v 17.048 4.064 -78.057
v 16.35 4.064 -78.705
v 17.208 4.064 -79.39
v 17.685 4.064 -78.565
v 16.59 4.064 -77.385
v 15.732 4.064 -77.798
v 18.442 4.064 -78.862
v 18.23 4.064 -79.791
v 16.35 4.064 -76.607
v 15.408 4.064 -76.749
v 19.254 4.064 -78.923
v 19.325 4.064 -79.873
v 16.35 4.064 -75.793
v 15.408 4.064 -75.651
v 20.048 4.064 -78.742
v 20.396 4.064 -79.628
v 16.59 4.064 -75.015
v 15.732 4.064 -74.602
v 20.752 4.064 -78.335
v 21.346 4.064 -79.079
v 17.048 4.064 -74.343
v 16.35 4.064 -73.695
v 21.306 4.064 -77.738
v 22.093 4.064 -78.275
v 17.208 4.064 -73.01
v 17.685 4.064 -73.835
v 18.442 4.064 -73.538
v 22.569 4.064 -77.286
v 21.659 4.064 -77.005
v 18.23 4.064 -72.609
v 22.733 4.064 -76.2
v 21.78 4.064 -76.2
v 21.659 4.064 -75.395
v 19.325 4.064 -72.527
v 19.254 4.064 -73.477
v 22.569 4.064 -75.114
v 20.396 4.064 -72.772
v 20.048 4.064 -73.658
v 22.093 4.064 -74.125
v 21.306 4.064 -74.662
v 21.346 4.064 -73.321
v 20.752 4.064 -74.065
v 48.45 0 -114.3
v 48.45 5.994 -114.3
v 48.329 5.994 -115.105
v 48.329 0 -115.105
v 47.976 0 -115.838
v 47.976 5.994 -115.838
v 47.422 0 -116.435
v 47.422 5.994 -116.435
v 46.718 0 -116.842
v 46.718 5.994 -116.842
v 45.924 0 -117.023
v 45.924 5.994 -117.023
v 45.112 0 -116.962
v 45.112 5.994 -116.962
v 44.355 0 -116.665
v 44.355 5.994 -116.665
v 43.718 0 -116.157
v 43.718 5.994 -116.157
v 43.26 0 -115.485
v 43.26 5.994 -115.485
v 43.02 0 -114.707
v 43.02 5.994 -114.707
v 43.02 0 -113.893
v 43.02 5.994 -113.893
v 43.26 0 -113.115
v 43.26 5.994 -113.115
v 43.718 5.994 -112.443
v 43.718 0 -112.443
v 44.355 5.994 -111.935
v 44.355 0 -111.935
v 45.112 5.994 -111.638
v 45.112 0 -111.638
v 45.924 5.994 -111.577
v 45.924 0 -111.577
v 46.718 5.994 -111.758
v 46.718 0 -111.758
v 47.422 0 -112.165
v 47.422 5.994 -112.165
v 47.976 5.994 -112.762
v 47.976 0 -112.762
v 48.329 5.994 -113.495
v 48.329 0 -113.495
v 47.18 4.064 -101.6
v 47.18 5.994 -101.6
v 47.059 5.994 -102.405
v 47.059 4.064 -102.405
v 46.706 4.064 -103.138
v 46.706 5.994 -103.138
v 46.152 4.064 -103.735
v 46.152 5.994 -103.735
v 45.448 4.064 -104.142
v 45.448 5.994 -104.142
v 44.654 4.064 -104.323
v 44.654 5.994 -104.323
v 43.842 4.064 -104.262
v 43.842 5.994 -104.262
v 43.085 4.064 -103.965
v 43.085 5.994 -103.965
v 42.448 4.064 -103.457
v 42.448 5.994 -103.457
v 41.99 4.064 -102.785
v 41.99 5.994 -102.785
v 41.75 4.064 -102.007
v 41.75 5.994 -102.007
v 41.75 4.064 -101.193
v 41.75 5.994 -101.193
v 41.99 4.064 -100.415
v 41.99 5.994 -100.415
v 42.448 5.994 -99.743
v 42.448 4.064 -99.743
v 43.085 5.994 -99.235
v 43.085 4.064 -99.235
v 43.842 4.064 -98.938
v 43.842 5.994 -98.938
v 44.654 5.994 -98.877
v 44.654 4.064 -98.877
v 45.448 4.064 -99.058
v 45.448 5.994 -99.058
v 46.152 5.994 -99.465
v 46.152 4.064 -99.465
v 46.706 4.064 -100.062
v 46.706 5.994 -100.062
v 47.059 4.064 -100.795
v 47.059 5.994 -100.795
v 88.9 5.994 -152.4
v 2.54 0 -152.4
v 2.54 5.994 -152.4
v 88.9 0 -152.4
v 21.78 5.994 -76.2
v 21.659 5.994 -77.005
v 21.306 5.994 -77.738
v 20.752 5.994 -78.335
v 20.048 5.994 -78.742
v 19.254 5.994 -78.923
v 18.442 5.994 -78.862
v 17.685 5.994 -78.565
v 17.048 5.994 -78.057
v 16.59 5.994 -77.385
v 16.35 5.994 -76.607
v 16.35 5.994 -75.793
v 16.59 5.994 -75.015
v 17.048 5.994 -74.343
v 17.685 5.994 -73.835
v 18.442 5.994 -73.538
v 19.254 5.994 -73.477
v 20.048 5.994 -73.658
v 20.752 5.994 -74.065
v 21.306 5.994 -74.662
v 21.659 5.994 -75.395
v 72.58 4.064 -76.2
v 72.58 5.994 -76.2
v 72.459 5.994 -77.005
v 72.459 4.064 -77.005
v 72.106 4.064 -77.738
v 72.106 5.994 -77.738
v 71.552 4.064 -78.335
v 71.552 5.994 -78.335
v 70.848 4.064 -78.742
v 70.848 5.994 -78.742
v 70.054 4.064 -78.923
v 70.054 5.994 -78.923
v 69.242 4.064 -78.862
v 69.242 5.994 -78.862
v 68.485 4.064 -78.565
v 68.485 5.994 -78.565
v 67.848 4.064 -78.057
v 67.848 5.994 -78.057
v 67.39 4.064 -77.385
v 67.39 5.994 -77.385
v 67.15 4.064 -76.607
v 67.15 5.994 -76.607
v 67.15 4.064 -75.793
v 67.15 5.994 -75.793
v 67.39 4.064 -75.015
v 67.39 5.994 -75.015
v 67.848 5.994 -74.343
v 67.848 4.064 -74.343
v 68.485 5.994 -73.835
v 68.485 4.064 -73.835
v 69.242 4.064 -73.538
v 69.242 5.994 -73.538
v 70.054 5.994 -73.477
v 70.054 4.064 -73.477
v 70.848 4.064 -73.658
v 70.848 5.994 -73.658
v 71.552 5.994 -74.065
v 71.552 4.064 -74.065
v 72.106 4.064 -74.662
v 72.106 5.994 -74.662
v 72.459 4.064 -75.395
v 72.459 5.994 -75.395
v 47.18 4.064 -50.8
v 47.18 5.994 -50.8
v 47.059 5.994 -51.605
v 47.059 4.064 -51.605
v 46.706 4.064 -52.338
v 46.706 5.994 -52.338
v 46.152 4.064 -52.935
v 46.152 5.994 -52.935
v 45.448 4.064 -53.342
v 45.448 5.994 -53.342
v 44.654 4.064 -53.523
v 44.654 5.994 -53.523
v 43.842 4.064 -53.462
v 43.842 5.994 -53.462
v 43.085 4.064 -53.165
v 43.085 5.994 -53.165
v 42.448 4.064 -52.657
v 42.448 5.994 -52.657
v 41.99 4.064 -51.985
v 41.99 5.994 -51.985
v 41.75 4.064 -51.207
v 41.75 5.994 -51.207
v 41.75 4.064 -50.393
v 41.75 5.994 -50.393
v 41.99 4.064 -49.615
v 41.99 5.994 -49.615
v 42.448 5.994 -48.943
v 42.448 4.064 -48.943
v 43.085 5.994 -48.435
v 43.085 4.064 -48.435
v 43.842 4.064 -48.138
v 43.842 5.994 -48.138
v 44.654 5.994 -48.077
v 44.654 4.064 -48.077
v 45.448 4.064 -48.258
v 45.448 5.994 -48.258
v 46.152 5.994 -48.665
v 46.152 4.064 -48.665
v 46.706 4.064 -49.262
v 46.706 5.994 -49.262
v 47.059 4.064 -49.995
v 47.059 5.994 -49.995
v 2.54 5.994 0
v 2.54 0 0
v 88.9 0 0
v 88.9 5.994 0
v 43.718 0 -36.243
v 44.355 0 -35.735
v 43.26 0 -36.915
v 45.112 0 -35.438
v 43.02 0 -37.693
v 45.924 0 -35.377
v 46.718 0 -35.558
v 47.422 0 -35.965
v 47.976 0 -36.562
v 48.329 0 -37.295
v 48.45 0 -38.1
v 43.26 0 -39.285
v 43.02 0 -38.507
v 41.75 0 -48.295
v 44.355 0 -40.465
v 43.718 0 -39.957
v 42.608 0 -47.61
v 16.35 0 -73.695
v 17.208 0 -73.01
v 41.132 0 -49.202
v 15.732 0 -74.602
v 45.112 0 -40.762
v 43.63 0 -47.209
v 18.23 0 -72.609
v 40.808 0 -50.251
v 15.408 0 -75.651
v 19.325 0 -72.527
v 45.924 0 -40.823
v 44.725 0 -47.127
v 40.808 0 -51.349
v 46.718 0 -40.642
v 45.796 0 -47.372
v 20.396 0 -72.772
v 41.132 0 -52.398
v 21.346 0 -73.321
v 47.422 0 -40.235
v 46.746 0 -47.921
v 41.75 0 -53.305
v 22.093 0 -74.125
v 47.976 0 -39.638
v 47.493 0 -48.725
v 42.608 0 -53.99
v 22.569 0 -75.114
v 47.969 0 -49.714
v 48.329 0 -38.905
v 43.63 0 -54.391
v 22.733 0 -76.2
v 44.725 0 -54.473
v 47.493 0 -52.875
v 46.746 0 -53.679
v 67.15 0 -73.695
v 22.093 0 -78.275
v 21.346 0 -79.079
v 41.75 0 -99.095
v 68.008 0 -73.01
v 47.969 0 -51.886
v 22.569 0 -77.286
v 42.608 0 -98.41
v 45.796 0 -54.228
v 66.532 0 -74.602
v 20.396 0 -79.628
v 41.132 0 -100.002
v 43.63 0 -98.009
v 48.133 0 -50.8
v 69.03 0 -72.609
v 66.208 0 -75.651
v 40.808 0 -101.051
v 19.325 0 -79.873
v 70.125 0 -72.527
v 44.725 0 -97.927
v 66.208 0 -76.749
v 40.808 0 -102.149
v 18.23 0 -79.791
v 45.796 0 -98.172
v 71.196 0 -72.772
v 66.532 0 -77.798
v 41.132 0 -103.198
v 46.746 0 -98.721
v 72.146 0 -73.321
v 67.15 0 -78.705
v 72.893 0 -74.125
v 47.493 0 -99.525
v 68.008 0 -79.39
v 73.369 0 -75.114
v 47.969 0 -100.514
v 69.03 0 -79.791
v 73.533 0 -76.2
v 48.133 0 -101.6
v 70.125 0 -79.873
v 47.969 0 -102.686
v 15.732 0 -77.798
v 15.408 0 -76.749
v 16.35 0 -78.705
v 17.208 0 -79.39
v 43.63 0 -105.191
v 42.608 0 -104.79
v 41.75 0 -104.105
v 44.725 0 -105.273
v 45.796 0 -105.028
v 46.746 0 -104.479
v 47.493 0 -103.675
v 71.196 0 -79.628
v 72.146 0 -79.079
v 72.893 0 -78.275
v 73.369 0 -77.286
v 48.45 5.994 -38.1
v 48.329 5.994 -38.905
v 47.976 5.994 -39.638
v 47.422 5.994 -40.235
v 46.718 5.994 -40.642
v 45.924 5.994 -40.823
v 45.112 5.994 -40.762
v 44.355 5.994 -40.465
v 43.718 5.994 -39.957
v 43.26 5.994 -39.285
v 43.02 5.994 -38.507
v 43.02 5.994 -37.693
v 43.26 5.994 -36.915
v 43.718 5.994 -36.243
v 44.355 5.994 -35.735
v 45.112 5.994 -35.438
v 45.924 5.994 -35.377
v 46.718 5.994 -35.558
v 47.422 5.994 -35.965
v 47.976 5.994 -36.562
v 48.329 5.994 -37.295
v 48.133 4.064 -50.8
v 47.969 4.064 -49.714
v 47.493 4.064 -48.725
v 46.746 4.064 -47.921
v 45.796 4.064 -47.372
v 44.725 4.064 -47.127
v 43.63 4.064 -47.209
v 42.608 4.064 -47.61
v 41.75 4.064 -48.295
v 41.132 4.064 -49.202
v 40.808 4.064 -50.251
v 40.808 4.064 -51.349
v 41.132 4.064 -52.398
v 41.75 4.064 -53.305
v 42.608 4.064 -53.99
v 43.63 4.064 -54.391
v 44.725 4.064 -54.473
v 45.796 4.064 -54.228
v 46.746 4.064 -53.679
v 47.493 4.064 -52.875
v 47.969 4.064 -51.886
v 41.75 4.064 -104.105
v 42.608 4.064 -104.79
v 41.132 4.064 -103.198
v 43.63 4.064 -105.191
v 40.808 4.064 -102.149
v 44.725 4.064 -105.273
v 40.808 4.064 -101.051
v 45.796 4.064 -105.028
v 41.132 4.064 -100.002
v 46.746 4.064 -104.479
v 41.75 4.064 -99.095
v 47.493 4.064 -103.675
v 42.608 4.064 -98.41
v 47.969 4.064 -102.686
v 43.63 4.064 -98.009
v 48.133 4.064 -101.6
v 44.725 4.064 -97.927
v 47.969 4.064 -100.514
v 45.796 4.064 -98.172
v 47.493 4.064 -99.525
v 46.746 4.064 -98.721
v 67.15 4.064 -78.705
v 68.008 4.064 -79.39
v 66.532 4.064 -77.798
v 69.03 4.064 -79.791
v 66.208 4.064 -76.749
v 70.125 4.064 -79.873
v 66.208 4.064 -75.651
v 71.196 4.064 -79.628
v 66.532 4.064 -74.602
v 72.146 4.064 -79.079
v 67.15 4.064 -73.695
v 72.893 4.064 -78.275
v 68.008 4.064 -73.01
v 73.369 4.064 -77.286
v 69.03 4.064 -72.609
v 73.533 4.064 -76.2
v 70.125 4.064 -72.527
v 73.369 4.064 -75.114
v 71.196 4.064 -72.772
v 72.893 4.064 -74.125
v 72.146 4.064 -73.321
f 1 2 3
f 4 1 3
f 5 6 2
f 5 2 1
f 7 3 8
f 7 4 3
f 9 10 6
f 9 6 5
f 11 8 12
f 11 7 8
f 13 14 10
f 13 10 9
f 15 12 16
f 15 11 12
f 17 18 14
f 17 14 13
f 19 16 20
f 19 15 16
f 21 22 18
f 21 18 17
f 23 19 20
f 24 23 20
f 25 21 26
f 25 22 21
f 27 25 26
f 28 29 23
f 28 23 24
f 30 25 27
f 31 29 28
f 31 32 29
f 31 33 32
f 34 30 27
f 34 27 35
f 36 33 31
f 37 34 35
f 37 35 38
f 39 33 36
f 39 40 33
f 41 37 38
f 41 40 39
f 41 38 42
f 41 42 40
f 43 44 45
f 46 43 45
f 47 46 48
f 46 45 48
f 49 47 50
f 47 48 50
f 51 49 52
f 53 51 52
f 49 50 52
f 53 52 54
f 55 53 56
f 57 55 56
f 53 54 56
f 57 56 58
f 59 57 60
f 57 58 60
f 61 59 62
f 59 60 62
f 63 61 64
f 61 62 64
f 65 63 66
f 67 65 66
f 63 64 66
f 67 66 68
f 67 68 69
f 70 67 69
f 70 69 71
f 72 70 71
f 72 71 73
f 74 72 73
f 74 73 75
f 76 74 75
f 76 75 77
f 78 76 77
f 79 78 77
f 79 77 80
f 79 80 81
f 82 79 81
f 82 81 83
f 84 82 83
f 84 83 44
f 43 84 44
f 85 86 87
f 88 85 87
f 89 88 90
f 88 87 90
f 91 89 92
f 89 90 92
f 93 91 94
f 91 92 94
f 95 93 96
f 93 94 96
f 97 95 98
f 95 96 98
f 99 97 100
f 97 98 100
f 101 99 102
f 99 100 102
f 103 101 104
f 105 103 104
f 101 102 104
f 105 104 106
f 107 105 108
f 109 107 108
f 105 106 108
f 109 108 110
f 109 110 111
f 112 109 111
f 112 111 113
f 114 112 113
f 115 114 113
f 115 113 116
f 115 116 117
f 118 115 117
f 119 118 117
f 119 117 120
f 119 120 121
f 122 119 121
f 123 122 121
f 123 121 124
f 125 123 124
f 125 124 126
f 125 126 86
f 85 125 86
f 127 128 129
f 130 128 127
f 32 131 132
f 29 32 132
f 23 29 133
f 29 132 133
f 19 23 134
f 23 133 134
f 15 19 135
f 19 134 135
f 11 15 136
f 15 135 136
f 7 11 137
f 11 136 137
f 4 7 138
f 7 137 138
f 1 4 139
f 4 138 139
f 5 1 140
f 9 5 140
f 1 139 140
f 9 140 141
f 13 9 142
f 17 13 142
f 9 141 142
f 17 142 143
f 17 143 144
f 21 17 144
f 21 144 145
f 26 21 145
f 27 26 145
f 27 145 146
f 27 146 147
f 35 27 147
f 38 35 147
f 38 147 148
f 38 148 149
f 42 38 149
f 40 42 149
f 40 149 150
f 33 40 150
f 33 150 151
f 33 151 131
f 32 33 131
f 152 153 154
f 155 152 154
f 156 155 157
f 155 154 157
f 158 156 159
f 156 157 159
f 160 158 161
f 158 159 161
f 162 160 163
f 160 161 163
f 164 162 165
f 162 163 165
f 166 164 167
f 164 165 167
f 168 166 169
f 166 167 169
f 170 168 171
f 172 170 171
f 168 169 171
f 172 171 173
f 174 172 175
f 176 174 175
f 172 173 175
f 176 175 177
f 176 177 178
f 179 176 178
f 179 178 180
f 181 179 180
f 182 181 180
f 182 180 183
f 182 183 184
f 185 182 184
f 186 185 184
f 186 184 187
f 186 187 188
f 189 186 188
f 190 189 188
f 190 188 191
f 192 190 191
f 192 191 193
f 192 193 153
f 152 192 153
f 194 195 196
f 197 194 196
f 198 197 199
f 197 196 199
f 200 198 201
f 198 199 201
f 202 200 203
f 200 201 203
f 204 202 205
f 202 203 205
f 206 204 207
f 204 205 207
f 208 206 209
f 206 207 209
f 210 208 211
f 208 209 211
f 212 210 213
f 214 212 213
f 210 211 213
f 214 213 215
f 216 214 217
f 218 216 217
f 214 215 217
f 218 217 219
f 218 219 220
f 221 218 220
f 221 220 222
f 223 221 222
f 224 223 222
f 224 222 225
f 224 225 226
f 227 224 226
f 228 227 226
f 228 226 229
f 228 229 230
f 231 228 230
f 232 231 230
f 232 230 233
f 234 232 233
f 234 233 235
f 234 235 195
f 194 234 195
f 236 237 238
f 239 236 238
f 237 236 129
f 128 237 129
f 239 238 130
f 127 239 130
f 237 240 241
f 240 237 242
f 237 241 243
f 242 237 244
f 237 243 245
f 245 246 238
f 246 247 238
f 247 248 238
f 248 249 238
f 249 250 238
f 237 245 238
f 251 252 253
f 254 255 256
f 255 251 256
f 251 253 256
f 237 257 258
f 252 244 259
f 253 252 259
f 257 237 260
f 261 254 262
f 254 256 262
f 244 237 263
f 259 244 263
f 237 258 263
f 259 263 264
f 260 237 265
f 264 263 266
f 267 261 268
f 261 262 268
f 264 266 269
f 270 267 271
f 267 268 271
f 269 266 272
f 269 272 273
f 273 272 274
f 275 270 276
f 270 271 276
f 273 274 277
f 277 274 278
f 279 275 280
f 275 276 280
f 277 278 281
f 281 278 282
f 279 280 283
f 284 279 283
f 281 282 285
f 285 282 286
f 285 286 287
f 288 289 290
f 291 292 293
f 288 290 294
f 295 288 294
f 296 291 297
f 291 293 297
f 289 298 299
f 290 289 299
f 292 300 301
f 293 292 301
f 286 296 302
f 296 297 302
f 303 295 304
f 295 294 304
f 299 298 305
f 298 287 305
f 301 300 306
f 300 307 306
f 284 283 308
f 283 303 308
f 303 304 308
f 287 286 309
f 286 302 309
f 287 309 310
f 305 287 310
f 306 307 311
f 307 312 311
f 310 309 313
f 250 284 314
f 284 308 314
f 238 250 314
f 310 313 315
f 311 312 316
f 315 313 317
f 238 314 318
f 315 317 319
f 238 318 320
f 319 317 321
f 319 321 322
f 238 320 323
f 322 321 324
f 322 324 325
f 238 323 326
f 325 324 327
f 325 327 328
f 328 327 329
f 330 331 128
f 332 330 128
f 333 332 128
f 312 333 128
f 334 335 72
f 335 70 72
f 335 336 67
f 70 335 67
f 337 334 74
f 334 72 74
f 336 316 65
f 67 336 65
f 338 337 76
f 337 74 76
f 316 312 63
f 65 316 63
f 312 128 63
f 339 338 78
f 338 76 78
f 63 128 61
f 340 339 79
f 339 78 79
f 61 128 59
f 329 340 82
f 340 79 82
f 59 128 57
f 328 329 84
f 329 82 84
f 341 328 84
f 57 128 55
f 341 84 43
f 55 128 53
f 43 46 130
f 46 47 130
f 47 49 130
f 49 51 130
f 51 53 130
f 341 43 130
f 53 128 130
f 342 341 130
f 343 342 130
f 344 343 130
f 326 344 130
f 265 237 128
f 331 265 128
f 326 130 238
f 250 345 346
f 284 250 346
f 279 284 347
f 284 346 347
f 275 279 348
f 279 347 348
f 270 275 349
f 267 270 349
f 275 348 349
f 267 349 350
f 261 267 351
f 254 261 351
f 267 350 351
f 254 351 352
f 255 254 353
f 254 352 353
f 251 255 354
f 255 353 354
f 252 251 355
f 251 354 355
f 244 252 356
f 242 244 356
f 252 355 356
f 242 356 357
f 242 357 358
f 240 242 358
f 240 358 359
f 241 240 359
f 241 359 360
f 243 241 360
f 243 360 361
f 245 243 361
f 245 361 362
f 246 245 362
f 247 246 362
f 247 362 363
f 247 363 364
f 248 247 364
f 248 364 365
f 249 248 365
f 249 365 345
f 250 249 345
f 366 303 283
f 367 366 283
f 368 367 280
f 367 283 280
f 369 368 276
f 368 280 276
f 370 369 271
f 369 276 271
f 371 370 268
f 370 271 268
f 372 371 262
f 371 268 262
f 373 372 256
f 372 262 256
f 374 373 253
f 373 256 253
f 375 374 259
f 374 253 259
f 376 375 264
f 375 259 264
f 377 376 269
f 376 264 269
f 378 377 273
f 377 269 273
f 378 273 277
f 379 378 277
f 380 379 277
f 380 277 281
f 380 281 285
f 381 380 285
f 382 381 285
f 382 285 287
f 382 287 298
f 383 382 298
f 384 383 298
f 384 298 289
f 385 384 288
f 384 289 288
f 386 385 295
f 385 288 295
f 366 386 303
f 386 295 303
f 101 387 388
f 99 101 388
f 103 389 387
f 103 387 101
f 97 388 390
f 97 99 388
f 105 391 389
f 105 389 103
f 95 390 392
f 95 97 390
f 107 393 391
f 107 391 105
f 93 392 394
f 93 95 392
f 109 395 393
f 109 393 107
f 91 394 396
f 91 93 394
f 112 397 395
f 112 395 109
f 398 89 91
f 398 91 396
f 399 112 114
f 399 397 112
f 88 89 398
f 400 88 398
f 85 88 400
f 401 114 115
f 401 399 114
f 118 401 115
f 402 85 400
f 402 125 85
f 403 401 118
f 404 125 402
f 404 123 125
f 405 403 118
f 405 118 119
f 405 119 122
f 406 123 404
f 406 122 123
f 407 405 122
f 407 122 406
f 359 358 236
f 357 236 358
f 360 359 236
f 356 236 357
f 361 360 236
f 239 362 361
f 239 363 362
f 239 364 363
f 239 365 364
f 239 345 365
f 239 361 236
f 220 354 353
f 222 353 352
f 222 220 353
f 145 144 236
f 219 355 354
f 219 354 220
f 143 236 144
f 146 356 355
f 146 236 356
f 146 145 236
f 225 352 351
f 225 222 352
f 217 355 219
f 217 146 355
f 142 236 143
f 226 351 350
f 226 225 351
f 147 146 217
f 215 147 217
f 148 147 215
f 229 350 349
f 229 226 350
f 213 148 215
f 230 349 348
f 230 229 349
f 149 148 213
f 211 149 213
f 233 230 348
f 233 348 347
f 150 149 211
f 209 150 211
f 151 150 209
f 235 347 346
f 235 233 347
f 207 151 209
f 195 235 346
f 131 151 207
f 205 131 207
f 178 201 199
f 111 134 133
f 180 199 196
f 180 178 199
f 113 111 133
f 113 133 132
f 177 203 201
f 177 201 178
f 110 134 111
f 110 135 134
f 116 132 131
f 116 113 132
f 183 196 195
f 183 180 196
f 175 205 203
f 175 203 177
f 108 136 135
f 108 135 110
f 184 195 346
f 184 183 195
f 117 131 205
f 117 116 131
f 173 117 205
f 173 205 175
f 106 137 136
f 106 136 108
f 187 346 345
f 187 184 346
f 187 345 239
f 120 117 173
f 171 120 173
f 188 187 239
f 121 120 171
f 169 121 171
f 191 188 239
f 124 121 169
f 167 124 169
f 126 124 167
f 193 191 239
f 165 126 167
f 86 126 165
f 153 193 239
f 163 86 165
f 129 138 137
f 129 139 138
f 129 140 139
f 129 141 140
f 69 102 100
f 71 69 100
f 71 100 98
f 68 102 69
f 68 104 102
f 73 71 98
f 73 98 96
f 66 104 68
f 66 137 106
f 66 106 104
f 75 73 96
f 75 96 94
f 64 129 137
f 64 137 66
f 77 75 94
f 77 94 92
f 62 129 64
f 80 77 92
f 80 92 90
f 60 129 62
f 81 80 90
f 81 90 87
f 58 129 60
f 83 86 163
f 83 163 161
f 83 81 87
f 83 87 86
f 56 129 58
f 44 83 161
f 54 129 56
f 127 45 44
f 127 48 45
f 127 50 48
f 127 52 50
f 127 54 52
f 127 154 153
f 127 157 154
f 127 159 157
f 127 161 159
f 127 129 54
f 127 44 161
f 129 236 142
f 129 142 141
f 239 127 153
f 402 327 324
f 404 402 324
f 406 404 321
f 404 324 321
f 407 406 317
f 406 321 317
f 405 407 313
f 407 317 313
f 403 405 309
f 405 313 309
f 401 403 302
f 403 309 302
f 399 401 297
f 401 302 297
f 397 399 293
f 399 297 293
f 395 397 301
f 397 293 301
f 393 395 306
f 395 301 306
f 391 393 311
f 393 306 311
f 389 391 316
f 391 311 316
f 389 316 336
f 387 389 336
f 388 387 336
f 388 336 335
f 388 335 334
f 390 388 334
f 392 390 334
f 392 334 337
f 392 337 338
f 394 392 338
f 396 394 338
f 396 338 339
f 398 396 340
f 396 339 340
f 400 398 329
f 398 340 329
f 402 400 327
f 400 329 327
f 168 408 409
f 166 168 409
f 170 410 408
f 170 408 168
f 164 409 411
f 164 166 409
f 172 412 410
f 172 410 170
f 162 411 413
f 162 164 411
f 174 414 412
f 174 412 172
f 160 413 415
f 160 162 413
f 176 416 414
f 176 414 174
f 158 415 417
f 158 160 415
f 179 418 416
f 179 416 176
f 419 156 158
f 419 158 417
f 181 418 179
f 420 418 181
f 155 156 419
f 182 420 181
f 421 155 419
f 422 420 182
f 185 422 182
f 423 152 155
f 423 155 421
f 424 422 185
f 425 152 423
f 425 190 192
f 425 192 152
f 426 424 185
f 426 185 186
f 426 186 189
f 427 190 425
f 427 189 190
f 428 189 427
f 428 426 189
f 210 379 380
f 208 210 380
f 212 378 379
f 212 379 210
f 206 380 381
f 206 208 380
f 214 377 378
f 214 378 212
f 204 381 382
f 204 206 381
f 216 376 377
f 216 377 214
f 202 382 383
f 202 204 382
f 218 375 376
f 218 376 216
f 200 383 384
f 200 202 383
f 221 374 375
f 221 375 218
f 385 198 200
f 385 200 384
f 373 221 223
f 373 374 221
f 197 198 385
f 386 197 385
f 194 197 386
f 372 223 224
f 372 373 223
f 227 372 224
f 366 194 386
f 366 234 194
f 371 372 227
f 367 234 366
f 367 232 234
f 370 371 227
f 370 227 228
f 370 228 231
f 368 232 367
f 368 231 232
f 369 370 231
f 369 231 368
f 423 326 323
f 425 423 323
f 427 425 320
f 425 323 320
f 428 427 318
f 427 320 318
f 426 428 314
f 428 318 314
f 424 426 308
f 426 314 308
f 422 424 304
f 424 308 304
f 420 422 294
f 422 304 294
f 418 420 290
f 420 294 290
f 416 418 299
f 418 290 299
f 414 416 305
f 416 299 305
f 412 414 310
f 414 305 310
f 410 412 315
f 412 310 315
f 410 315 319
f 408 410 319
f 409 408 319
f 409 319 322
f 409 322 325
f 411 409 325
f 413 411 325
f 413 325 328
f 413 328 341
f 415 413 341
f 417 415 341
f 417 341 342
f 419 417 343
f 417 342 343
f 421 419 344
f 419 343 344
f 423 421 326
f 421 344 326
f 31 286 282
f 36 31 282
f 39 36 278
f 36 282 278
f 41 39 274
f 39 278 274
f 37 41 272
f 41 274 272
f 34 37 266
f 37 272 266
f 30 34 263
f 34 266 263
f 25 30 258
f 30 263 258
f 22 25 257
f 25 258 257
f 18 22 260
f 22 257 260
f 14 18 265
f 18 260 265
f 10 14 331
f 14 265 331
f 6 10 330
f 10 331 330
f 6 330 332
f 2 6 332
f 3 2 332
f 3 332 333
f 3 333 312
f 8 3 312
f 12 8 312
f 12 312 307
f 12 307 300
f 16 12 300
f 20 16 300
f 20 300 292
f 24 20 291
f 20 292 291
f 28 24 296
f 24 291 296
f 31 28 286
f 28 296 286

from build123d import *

# Parameters (mm, degrees)
SKETCH2_W               = 88.9
SKETCH2_H               = 152.4
BOSS_EXTRUDE1_DEPTH     = 5.9944
SKETCH4_R               = 2.7305
CUT_EXTRUDE2_DEPTH      = 1
CUT_EXTRUDE2_DEPTH_BACK = 6.9944
SKETCH5_R               = 2.7305
CUT_EXTRUDE3_DEPTH      = 1
CUT_EXTRUDE3_DEPTH_BACK = 6.9944
SKETCH7_W               = 2.54
SKETCH7_H               = 152.4
CUT_EXTRUDE5_DEPTH      = 1
CUT_EXTRUDE5_DEPTH_BACK = 6.9944
SKETCH8_R               = 3.683
CUT_EXTRUDE6_DEPTH      = 4.064


with BuildPart() as part:
    # Sketch2 → Boss-Extrude1 (new body)
    with BuildSketch(Plane(origin=(0, 0, 0), x_dir=(1, 0, 0), z_dir=(0, 1, 0))):
        with Locations((44.45, 76.2)):
            Rectangle(SKETCH2_W, SKETCH2_H)
    extrude(amount=BOSS_EXTRUDE1_DEPTH)

    # Sketch4 → Cut-Extrude2 (cut, two sides)
    with BuildSketch(Plane(origin=(0, 5.9944, 0), x_dir=(1, 0, 0), z_dir=(0, 1, 0))) as cut_extrude2_sk:
        with Locations((45.72, 114.3)):
            Circle(SKETCH4_R)
        with Locations((45.72, 38.1)):
            Circle(SKETCH4_R)
    extrude(amount=CUT_EXTRUDE2_DEPTH, mode=Mode.SUBTRACT)
    extrude(cut_extrude2_sk.sketch, amount=-CUT_EXTRUDE2_DEPTH_BACK, mode=Mode.SUBTRACT)

    # Sketch5 → Cut-Extrude3 (cut, two sides)
    with BuildSketch(Plane(origin=(0, 5.9944, 0), x_dir=(1, 0, 0), z_dir=(0, 1, 0))) as cut_extrude3_sk:
        with Locations((69.85, 76.2)):
            Circle(SKETCH5_R)
        with Locations((19.05, 76.2)):
            Circle(SKETCH5_R)
        with Locations((44.45, 101.6)):
            Circle(SKETCH5_R)
        with Locations((44.45, 50.8)):
            Circle(SKETCH5_R)
    extrude(amount=CUT_EXTRUDE3_DEPTH, mode=Mode.SUBTRACT)
    extrude(cut_extrude3_sk.sketch, amount=-CUT_EXTRUDE3_DEPTH_BACK, mode=Mode.SUBTRACT)

    # Sketch7 → Cut-Extrude5 (cut, two sides)
    with BuildSketch(Plane(origin=(0, 5.9944, 0), x_dir=(1, 0, 0), z_dir=(0, 1, 0))) as cut_extrude5_sk:
        with Locations((1.27, 76.2)):
            Rectangle(SKETCH7_W, SKETCH7_H)
    extrude(amount=CUT_EXTRUDE5_DEPTH, mode=Mode.SUBTRACT)
    extrude(cut_extrude5_sk.sketch, amount=-CUT_EXTRUDE5_DEPTH_BACK, mode=Mode.SUBTRACT)

    # Sketch8 → Cut-Extrude6 (cut)
    with BuildSketch(Plane.XZ):
        with Locations((19.05, -76.2)):
            Circle(SKETCH8_R)
        with Locations((44.45, -50.8)):
            Circle(SKETCH8_R)
        with Locations((69.85, -76.2)):
            Circle(SKETCH8_R)
        with Locations((44.45, -101.6)):
            Circle(SKETCH8_R)
    extrude(amount=-CUT_EXTRUDE6_DEPTH, mode=Mode.SUBTRACT)


solid = part.part
